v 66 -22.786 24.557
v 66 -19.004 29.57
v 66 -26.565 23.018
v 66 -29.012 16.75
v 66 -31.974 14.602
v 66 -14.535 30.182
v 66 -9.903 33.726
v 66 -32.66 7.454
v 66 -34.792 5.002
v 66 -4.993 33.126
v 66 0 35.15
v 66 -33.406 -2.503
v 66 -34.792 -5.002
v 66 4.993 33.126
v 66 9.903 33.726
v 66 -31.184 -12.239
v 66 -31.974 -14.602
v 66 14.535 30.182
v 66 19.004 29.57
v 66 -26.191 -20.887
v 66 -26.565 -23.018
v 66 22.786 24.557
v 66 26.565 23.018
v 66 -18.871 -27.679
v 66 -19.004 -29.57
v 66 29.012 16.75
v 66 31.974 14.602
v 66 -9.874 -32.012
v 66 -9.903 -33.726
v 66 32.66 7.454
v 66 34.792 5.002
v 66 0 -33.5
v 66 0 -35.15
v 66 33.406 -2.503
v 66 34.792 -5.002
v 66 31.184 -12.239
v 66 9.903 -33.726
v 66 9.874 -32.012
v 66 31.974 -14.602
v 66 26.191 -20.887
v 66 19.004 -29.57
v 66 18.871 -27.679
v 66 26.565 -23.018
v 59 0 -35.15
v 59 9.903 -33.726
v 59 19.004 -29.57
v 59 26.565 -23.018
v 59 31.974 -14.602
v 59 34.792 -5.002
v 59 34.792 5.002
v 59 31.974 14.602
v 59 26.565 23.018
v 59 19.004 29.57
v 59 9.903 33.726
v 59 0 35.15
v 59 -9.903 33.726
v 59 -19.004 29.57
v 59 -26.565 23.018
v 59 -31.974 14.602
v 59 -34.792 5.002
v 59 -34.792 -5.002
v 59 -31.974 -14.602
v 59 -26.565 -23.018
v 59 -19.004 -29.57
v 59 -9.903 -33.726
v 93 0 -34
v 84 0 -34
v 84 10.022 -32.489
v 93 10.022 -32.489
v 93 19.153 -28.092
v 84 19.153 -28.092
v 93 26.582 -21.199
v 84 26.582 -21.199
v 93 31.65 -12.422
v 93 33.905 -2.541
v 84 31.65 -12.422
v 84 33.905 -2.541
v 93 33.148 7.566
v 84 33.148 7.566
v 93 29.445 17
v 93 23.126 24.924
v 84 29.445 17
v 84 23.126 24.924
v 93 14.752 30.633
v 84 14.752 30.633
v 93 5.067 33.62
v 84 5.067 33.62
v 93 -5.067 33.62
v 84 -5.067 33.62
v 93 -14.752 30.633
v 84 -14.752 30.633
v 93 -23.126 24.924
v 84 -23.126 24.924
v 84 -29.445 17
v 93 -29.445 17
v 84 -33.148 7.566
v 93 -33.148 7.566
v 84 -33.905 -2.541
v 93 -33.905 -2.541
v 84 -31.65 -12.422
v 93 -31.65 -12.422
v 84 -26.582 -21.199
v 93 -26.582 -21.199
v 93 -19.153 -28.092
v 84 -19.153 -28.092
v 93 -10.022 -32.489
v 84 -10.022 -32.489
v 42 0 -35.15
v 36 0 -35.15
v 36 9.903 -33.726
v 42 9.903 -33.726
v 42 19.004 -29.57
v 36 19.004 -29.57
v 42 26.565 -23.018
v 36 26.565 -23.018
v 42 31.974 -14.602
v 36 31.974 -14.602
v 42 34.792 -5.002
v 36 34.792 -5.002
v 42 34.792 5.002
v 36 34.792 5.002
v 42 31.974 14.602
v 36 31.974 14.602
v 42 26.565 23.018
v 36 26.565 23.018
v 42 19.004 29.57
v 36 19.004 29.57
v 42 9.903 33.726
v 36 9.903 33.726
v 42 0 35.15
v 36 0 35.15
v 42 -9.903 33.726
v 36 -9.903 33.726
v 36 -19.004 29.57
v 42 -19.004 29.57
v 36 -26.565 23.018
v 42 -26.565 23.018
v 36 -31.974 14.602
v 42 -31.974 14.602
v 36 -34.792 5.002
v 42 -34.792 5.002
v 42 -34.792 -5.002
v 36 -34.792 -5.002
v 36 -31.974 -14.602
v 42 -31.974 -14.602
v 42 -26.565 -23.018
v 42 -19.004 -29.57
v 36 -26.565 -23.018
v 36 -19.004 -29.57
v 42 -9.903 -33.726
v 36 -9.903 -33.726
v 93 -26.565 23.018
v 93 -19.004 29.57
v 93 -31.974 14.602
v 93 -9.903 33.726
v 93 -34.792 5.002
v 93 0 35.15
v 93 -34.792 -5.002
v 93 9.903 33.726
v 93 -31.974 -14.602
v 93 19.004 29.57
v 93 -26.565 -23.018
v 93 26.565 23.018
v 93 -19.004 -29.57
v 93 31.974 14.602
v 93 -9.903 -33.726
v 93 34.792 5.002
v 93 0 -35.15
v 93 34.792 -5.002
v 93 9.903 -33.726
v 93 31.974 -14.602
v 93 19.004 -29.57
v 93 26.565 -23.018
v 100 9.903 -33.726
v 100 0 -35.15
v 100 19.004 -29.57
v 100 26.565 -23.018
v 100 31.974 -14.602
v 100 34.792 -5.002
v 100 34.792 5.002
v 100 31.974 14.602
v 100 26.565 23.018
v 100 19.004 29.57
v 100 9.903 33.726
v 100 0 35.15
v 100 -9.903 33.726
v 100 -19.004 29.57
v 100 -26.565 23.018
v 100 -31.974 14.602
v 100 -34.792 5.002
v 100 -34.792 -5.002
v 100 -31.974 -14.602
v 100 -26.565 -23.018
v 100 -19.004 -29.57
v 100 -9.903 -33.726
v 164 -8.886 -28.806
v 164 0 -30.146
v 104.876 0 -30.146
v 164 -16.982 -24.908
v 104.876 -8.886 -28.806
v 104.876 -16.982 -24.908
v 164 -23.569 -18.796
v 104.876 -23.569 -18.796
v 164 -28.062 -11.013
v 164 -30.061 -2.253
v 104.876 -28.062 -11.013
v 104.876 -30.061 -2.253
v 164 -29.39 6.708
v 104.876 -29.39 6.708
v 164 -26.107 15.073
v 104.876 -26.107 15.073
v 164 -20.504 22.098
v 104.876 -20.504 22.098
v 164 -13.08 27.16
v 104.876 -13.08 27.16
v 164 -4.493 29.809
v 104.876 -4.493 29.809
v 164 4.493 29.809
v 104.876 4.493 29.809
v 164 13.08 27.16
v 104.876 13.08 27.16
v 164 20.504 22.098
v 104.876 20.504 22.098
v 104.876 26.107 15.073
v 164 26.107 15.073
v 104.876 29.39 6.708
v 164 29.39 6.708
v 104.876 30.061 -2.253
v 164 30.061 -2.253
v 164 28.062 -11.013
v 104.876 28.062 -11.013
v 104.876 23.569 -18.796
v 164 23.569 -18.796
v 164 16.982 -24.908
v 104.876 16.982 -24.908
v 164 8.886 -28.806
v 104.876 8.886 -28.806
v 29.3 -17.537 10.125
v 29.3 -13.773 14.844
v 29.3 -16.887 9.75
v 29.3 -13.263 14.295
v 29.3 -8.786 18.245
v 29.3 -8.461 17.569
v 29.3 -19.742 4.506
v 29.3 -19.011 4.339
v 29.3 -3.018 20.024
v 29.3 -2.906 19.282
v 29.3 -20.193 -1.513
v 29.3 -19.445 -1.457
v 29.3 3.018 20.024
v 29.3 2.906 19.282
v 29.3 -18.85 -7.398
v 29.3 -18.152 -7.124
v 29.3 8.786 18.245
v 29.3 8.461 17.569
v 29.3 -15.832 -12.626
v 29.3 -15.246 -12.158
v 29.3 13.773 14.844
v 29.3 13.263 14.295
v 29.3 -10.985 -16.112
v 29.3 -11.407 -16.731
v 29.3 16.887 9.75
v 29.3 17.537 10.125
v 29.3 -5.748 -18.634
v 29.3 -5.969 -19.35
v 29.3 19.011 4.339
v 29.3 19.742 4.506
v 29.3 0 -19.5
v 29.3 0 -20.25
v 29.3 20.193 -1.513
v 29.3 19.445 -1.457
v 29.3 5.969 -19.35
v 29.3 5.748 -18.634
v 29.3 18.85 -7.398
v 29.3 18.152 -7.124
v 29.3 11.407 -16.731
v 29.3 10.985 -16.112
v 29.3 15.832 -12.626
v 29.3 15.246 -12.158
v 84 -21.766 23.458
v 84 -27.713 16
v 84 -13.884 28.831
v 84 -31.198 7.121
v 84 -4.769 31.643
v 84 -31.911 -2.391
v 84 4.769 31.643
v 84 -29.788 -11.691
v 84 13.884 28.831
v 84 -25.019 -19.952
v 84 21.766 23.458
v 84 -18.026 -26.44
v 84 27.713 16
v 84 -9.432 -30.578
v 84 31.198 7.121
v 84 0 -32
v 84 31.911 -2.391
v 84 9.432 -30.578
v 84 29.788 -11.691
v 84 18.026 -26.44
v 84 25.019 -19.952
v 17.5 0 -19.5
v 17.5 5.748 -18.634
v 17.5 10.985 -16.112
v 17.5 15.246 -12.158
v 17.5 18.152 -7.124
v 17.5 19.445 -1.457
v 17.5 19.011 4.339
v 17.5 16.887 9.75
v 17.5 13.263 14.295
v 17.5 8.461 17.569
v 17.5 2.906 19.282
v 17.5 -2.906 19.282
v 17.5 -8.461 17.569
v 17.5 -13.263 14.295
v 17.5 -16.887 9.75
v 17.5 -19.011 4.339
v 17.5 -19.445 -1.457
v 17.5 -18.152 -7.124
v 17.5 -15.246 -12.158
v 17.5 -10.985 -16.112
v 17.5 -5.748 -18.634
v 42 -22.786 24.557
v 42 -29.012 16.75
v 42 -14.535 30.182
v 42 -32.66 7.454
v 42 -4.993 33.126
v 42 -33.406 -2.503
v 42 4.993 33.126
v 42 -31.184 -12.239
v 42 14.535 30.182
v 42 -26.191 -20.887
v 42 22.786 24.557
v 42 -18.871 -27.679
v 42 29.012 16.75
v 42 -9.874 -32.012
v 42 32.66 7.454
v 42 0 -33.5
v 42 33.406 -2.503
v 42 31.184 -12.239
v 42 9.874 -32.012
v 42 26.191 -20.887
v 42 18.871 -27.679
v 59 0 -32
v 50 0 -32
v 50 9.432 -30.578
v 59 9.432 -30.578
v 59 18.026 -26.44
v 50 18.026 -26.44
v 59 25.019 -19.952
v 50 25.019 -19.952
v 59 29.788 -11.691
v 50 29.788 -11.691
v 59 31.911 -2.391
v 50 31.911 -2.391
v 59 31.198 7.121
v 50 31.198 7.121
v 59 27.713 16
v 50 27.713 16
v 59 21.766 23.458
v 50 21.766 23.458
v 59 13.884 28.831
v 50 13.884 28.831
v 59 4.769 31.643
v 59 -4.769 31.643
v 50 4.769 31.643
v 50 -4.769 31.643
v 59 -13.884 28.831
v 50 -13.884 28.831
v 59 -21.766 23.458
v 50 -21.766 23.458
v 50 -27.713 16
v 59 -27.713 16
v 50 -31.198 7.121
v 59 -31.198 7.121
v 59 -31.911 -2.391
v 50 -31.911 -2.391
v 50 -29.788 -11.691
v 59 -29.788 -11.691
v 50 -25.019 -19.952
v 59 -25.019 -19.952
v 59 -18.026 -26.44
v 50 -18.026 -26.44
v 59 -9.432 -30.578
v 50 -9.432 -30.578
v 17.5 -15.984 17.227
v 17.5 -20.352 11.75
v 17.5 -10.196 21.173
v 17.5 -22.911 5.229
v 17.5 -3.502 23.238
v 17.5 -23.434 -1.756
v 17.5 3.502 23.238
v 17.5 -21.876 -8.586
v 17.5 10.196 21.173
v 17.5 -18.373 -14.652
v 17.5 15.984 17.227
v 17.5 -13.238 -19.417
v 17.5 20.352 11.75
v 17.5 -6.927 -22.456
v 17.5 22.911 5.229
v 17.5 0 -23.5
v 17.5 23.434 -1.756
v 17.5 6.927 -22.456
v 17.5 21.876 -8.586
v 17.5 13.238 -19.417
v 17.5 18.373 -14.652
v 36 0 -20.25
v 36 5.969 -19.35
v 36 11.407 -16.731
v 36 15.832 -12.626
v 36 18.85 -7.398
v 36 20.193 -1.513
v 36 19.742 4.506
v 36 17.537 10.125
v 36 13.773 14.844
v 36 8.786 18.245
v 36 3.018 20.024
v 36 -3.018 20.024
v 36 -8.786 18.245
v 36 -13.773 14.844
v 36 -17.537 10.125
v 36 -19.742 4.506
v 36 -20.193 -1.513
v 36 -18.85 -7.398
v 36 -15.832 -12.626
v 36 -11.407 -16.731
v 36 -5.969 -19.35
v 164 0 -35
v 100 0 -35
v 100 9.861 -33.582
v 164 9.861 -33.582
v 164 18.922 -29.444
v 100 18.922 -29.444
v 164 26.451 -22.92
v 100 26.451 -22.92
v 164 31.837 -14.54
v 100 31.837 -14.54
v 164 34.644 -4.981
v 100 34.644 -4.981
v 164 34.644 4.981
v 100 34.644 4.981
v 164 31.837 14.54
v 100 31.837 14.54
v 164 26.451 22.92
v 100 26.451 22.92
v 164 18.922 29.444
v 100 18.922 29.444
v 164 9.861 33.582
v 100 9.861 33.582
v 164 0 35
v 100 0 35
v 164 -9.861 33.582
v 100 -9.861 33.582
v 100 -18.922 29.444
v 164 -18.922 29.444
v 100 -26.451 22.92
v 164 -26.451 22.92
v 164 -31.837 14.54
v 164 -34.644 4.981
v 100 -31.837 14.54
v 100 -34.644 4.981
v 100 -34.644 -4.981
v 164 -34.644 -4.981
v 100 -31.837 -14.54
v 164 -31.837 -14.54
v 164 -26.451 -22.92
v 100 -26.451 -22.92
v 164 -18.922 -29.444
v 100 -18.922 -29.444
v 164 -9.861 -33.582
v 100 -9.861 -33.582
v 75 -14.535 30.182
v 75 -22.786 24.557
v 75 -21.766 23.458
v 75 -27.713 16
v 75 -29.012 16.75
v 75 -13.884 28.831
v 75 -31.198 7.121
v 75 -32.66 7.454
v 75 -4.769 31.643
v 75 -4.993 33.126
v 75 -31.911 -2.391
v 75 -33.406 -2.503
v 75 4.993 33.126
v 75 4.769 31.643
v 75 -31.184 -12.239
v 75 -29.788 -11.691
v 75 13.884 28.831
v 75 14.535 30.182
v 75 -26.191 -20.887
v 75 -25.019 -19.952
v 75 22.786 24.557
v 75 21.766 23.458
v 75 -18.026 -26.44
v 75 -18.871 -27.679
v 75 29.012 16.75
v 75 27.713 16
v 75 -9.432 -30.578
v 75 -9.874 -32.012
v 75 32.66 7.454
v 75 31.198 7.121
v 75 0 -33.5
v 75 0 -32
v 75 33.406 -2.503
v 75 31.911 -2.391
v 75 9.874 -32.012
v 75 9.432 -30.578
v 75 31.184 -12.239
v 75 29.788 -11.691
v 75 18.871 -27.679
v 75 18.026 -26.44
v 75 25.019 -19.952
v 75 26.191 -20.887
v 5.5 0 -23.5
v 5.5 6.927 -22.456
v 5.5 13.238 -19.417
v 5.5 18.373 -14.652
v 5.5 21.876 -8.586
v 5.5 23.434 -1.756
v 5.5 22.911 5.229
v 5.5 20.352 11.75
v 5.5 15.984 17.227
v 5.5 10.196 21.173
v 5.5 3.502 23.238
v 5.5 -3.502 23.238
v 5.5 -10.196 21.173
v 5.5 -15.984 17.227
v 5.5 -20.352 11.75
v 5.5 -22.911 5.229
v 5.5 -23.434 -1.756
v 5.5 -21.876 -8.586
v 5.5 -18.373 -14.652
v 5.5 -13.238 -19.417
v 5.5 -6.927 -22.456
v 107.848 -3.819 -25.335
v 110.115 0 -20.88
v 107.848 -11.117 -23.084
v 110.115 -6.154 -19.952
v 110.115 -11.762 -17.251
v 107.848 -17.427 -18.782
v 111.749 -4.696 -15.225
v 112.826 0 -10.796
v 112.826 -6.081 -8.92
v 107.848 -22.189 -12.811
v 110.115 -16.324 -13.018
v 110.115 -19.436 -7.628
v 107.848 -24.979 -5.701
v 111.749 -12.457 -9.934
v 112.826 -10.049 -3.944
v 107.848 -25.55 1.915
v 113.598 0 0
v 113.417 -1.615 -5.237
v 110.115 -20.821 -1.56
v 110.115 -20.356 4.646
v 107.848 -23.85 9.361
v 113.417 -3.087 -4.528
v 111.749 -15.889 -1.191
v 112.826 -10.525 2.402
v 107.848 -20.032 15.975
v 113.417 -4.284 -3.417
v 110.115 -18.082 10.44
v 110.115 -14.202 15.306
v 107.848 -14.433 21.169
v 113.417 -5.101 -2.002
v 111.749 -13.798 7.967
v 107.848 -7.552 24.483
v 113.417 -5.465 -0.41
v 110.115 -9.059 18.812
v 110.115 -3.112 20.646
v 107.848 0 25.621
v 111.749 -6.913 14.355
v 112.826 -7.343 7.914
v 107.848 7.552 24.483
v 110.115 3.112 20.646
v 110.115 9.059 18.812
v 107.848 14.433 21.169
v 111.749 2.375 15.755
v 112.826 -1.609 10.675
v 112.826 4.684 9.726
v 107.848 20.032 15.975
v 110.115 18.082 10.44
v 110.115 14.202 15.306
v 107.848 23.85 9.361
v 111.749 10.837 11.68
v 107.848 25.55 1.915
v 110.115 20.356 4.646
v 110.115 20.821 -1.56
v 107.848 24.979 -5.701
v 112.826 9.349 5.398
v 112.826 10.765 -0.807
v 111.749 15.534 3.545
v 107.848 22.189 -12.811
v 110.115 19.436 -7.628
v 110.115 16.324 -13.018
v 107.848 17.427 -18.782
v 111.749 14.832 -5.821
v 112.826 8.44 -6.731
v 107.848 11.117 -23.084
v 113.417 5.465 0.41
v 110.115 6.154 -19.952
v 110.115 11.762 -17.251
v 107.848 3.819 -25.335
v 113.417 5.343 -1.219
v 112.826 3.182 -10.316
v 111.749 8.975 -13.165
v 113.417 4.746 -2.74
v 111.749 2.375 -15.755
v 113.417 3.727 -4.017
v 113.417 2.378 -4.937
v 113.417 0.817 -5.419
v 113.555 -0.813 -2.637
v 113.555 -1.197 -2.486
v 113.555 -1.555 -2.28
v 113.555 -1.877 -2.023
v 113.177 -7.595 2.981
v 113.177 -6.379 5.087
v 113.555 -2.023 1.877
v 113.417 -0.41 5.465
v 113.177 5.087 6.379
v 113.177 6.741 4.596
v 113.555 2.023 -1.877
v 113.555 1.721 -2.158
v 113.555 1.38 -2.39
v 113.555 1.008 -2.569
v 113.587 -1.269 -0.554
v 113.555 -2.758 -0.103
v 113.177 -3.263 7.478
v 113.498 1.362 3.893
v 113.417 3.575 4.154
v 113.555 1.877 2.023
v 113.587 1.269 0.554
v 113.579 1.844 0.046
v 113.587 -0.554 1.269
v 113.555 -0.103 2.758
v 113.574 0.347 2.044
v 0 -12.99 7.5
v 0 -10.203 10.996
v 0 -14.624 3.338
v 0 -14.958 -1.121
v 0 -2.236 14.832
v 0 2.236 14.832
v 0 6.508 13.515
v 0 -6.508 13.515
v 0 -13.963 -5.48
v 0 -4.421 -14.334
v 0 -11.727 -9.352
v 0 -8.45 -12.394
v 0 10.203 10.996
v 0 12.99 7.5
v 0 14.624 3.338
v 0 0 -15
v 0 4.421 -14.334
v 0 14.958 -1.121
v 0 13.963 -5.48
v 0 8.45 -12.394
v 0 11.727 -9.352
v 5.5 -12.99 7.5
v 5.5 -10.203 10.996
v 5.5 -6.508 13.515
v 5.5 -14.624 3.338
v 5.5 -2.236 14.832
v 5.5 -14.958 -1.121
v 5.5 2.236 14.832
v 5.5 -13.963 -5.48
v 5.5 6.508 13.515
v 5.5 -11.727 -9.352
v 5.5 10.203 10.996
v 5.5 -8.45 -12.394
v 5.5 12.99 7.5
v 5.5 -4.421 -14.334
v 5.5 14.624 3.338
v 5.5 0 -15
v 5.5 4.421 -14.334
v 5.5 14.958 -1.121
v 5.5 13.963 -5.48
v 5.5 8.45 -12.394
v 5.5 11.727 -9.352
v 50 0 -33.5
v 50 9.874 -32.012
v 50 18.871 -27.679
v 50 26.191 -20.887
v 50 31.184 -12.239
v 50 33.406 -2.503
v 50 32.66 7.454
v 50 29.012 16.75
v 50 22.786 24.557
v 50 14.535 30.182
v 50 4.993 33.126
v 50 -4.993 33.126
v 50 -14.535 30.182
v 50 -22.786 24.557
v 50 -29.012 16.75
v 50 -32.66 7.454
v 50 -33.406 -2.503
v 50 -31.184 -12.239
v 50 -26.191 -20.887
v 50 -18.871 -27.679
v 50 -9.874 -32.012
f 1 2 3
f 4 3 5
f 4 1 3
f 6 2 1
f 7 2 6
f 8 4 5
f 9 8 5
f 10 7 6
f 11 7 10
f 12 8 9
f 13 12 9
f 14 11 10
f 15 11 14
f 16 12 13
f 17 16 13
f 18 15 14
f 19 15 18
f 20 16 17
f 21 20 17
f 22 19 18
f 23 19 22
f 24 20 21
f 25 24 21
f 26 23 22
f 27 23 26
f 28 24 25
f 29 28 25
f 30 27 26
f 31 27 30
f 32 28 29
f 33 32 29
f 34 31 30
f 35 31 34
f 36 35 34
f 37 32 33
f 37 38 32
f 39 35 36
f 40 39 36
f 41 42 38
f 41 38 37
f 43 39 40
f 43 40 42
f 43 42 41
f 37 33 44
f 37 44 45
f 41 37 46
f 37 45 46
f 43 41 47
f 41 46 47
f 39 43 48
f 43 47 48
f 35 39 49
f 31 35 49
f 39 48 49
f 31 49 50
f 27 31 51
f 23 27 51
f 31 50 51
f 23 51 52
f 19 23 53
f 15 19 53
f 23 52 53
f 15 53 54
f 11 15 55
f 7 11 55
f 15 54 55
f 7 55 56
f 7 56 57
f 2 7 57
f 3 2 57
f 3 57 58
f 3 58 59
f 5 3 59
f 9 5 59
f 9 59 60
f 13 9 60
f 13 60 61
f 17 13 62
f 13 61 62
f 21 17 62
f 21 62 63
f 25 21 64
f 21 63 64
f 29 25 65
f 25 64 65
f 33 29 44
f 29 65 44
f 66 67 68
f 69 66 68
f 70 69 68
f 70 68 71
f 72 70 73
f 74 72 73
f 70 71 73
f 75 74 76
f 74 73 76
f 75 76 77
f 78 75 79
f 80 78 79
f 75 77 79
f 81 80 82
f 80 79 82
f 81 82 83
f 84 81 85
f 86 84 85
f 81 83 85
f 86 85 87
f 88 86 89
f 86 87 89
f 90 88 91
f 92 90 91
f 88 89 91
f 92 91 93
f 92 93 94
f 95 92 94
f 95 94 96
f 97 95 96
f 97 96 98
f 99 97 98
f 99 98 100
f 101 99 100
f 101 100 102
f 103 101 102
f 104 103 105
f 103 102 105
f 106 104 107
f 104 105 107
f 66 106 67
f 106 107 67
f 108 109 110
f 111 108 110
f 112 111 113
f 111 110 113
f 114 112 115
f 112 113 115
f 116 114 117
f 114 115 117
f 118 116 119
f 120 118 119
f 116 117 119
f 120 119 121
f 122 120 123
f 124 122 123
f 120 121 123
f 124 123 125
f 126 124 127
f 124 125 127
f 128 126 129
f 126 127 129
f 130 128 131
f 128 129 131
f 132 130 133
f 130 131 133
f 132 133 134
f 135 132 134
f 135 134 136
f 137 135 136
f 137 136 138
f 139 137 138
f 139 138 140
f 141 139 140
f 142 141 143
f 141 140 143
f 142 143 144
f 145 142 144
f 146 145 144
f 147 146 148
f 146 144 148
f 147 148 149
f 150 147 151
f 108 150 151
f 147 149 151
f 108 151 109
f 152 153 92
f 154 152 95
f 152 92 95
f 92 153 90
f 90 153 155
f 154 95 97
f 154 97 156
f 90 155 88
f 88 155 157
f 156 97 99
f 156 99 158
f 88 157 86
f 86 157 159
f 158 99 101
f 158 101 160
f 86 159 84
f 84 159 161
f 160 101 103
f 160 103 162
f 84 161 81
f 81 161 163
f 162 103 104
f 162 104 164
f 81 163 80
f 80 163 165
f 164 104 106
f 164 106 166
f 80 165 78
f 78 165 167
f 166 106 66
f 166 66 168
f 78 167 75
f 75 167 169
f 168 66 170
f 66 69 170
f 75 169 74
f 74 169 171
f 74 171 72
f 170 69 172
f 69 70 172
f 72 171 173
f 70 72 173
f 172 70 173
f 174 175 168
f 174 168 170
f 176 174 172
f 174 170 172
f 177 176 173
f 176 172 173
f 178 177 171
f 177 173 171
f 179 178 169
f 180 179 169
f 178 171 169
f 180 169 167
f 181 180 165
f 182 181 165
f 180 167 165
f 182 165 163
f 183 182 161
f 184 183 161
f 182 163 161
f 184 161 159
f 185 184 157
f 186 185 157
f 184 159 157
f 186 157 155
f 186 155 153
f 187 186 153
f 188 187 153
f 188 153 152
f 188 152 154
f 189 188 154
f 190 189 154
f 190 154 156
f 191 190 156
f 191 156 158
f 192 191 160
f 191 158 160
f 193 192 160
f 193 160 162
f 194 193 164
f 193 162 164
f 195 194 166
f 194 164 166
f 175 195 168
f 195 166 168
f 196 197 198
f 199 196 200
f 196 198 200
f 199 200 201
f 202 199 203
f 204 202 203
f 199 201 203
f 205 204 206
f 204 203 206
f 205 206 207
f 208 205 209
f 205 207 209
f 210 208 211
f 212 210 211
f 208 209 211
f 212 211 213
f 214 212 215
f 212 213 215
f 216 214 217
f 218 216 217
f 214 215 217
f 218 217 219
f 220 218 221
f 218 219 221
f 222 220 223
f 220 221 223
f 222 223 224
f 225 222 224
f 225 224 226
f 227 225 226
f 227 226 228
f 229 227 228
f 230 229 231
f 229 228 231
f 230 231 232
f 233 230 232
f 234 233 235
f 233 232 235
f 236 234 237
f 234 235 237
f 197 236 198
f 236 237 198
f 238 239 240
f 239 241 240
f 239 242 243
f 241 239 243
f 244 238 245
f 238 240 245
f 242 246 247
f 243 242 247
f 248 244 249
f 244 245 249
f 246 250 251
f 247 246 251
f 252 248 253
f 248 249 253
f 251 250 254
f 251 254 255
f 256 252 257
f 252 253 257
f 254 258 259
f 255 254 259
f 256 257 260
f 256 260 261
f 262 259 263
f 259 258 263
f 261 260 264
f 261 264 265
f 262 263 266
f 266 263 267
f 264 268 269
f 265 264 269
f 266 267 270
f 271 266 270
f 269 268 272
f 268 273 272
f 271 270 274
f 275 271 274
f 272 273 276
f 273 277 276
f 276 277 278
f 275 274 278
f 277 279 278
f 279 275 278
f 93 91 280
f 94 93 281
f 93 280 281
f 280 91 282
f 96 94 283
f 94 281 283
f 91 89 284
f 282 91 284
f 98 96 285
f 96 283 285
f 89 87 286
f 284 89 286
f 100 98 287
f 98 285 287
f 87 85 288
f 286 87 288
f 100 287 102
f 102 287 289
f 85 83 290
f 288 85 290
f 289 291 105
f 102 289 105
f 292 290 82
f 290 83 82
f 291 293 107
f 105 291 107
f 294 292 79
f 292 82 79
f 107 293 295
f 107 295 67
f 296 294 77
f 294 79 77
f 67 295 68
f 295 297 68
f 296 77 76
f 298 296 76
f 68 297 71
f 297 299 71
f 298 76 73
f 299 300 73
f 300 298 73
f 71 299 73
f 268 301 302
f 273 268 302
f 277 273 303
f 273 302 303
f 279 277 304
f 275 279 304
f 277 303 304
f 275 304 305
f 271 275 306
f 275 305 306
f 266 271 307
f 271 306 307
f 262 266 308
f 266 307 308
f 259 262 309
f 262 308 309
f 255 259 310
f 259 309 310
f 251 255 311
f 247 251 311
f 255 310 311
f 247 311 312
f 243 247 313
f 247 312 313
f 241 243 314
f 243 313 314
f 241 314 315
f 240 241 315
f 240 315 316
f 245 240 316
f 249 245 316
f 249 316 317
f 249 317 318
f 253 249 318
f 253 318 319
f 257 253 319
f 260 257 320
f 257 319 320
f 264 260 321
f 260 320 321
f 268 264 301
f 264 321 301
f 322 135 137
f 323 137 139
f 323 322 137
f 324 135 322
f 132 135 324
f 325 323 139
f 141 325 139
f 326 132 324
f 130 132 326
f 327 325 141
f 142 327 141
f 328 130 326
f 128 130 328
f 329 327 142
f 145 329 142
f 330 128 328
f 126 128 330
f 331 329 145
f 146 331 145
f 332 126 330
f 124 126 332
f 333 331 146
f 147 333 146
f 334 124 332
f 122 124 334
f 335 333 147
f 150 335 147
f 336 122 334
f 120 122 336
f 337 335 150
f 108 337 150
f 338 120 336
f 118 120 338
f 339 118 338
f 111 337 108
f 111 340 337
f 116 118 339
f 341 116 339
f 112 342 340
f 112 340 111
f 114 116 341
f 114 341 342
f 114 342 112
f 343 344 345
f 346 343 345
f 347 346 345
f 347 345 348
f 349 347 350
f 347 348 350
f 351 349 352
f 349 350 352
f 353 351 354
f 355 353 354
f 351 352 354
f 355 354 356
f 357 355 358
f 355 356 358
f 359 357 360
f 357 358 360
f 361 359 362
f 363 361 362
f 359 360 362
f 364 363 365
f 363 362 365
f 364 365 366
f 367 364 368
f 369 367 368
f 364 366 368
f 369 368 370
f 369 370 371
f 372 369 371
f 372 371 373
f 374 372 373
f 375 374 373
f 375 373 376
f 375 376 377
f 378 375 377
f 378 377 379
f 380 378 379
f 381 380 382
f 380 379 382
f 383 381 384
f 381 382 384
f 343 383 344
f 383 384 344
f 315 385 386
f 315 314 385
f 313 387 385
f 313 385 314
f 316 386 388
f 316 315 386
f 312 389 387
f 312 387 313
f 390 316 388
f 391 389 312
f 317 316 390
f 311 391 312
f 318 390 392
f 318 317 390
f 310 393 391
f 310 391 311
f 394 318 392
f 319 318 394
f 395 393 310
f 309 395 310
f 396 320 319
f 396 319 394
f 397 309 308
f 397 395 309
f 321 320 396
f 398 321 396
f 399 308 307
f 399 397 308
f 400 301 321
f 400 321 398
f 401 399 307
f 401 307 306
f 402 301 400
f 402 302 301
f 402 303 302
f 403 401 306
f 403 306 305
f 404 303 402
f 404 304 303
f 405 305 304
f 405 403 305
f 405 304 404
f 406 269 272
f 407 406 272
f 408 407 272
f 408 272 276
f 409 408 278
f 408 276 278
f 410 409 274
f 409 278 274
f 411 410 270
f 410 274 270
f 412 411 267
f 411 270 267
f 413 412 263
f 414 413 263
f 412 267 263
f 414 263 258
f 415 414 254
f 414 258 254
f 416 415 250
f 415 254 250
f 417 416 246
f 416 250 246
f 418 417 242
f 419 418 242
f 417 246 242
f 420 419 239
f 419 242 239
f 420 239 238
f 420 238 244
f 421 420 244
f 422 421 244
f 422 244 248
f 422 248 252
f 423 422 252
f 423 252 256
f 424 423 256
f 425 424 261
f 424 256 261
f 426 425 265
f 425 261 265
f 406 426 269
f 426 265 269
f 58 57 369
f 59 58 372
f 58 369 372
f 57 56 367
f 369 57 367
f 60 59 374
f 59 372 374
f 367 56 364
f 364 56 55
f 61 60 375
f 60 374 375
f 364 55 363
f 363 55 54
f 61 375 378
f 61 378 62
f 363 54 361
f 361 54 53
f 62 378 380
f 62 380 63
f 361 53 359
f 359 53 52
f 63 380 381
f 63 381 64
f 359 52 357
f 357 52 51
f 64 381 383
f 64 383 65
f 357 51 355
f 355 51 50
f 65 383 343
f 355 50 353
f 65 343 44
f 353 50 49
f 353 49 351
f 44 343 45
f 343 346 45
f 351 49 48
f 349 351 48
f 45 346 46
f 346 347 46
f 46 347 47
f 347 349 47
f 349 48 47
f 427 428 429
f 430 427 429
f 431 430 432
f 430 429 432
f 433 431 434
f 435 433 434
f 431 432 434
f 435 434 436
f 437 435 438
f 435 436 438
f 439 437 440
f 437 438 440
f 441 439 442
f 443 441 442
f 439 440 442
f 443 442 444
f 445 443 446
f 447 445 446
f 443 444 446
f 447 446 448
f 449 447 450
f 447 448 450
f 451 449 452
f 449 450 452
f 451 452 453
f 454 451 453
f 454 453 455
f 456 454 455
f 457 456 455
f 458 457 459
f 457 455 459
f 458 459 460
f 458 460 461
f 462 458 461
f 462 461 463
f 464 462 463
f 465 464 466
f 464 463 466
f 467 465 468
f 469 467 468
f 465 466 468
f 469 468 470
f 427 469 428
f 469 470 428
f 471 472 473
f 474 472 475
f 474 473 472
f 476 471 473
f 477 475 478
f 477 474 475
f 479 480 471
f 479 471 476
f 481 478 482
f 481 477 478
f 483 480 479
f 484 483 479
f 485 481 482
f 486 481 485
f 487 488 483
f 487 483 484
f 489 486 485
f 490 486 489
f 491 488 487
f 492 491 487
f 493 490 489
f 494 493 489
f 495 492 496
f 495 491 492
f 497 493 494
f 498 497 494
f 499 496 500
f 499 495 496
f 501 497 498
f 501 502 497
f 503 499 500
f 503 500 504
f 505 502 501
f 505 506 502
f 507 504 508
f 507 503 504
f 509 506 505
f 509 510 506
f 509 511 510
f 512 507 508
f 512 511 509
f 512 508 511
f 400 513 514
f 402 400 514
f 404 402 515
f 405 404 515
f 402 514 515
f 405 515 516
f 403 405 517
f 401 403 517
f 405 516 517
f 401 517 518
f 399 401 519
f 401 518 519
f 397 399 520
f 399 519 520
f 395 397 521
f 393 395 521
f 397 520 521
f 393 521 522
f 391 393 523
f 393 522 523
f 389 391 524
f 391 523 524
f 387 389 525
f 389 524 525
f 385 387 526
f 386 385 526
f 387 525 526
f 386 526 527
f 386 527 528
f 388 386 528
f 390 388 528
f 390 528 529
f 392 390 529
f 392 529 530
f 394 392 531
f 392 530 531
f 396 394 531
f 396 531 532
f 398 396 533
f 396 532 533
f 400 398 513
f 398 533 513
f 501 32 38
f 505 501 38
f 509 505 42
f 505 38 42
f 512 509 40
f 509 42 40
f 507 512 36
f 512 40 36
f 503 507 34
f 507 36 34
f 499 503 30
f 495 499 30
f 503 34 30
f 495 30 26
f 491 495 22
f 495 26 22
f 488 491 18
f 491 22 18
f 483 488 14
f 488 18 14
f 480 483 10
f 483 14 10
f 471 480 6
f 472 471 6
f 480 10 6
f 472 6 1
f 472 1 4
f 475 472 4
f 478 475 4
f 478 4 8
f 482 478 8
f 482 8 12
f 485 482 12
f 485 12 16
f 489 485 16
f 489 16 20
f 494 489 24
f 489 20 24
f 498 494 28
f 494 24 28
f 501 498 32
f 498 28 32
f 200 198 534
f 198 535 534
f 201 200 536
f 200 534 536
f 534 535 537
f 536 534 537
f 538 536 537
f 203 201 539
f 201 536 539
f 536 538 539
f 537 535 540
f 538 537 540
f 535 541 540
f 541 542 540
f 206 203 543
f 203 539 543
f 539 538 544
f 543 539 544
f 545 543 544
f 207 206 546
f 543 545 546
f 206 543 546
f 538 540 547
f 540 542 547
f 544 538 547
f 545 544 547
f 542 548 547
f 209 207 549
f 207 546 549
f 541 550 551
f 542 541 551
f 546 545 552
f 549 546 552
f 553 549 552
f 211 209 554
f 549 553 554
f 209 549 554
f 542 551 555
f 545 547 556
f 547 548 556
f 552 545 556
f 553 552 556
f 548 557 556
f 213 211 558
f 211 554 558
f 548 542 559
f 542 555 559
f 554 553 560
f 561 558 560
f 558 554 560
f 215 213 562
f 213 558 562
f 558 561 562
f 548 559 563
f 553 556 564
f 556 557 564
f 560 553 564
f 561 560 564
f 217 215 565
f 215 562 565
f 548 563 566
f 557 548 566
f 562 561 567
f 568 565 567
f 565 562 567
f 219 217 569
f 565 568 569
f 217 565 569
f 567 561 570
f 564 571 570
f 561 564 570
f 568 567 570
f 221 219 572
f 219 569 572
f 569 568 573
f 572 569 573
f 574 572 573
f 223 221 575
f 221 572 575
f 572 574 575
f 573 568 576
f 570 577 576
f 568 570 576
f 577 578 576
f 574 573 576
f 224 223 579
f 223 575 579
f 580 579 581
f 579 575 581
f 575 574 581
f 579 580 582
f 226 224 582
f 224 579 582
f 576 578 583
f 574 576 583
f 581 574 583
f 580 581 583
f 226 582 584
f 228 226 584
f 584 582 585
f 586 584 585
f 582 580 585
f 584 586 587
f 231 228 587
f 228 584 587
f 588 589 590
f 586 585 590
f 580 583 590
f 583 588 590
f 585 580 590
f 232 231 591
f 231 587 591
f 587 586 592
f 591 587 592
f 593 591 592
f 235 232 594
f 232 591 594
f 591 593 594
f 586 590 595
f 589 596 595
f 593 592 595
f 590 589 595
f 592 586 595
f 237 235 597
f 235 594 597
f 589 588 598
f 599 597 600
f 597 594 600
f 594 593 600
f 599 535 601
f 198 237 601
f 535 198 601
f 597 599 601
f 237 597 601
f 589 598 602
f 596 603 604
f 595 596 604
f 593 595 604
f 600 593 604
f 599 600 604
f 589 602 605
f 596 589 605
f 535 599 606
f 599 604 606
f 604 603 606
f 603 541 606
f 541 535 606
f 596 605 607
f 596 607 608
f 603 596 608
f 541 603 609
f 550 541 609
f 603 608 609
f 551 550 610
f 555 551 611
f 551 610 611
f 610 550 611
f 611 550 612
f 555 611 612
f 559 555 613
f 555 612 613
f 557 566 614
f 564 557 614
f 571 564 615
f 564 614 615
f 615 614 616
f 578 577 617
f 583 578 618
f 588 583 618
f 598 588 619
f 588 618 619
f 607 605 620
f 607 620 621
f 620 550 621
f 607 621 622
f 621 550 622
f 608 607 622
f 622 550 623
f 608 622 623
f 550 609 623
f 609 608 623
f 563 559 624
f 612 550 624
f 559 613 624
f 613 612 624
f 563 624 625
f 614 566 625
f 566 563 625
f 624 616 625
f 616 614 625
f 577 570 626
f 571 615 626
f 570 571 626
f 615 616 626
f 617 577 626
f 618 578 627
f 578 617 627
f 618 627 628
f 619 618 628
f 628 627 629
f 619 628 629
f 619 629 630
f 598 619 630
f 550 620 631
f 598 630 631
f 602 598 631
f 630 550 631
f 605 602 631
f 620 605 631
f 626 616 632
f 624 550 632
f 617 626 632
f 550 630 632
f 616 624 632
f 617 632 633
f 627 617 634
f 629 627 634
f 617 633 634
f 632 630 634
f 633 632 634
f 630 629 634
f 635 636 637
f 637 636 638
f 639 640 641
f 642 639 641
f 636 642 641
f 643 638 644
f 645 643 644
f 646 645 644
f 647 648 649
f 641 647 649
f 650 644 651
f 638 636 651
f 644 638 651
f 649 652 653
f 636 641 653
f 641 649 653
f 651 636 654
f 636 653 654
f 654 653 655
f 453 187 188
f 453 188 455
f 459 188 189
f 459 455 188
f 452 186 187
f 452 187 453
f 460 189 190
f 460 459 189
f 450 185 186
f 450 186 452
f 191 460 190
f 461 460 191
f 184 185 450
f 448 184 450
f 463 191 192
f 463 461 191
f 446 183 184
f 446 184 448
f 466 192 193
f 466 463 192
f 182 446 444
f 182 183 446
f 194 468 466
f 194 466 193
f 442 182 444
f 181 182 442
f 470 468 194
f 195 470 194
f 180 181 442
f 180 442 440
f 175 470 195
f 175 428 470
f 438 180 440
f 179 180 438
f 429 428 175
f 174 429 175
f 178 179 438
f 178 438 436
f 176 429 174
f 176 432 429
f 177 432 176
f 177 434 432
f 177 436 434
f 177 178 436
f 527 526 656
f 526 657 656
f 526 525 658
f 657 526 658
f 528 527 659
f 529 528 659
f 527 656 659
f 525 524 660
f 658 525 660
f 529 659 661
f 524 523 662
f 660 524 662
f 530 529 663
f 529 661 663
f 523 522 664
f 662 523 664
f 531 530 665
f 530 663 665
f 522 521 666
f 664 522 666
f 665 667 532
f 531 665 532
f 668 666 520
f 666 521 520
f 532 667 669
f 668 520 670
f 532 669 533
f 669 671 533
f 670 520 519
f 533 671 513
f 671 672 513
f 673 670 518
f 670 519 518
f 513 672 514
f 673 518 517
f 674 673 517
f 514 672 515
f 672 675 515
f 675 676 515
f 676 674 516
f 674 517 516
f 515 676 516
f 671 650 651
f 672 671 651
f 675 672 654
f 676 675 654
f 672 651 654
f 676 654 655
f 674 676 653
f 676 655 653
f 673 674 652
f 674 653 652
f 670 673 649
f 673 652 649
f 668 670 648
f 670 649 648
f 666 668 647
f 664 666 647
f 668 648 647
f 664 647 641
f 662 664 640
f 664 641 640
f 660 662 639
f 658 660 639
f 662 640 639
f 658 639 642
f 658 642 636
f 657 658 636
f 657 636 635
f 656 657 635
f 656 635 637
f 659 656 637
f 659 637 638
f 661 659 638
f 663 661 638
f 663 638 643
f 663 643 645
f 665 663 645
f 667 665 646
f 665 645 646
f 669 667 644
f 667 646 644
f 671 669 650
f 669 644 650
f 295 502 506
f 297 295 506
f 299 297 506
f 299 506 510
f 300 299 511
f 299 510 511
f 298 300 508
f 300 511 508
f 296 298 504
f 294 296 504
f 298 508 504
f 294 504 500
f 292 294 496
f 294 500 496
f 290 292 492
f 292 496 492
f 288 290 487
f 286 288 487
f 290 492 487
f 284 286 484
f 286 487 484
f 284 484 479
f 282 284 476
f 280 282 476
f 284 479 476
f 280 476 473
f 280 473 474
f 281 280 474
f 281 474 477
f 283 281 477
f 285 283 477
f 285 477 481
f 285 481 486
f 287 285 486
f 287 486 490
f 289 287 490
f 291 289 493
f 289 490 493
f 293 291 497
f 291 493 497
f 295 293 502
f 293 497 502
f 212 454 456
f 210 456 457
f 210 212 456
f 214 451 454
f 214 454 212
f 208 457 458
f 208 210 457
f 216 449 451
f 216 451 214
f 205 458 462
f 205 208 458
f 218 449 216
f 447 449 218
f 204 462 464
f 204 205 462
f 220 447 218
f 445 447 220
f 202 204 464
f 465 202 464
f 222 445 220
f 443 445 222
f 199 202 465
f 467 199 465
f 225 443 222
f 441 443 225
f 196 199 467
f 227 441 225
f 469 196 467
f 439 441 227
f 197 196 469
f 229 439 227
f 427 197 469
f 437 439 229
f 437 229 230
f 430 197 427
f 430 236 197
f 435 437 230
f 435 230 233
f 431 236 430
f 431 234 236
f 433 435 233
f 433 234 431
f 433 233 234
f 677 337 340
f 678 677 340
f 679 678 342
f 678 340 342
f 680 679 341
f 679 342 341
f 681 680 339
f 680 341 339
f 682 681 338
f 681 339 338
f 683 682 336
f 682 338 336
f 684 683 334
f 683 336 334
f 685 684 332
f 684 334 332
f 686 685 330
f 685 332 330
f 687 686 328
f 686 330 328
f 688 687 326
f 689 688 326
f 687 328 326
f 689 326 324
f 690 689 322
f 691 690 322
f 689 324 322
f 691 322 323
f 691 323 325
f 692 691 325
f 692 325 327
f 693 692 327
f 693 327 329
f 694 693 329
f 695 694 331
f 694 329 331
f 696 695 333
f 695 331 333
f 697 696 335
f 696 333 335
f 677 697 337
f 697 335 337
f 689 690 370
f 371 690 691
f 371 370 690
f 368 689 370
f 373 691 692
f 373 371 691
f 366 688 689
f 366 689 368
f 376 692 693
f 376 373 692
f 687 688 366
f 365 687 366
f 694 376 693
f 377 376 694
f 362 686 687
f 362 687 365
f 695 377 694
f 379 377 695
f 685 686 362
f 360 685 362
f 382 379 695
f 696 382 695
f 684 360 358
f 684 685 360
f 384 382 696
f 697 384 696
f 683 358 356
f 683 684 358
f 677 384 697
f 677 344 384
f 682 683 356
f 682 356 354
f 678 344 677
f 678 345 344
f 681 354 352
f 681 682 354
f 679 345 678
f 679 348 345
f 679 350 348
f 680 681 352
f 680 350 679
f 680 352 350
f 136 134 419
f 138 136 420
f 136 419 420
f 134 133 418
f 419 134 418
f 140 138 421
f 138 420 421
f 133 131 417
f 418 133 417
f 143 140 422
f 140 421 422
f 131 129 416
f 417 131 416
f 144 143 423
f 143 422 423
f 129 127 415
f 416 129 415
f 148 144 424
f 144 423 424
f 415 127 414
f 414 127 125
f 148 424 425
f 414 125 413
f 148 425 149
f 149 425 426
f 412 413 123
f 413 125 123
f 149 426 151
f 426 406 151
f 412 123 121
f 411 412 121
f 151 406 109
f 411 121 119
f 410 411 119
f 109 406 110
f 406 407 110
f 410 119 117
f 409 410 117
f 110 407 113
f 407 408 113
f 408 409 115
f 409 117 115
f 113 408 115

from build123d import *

# Parameters (mm, degrees)
SKETCH1_R            = 15
BOSS_EXTRUDE1_DEPTH  = 5.5
SKETCH2_R            = 23.5
BOSS_EXTRUDE2_DEPTH  = 12
SKETCH4_R            = 19.5
BOSS_EXTRUDE3_DEPTH  = 11.8
SKETCH6_R            = 20.25
BOSS_EXTRUDE4_DEPTH  = 6.7
SKETCH7_R            = 35.15
BOSS_EXTRUDE5_DEPTH  = 6
SKETCH8_R            = 33.5
BOSS_EXTRUDE6_DEPTH  = 8
SKETCH9_R            = 32
BOSS_EXTRUDE7_DEPTH  = 9
SKETCH10_R           = 35.15
BOSS_EXTRUDE8_DEPTH  = 7
SKETCH11_R           = 33.5
BOSS_EXTRUDE9_DEPTH  = 9
SKETCH12_R           = 32
BOSS_EXTRUDE10_DEPTH = 9
SKETCH13_R           = 34
BOSS_EXTRUDE11_DEPTH = 9
SKETCH14_R           = 35.15
BOSS_EXTRUDE12_DEPTH = 7
SKETCH15_R           = 35
BOSS_EXTRUDE13_DEPTH = 64


with BuildPart() as part:
    # Sketch1 → Boss-Extrude1 (new body)
    with BuildSketch(Plane(origin=(0, 0, 0), x_dir=(0, 0, -1), z_dir=(1, 0, 0))):
        Circle(SKETCH1_R)
    extrude(amount=BOSS_EXTRUDE1_DEPTH)

    # Sketch2 → Boss-Extrude2 (add)
    with BuildSketch(Plane(origin=(5.5, 0, 0), x_dir=(0, 0, -1), z_dir=(1, 0, 0))):
        Circle(SKETCH2_R)
    extrude(amount=BOSS_EXTRUDE2_DEPTH)

    # Sketch4 → Boss-Extrude3 (add)
    with BuildSketch(Plane(origin=(17.5, 0, 0), x_dir=(0, 0, -1), z_dir=(1, 0, 0))):
        Circle(SKETCH4_R)
    extrude(amount=BOSS_EXTRUDE3_DEPTH)

    # Sketch6 → Boss-Extrude4 (add)
    with BuildSketch(Plane(origin=(29.3, 0, 0), x_dir=(0, 0, -1), z_dir=(1, 0, 0))):
        Circle(SKETCH6_R)
    extrude(amount=BOSS_EXTRUDE4_DEPTH)

    # Sketch7 → Boss-Extrude5 (add)
    with BuildSketch(Plane(origin=(36, 0, 0), x_dir=(0, 0, -1), z_dir=(1, 0, 0))):
        Circle(SKETCH7_R)
    extrude(amount=BOSS_EXTRUDE5_DEPTH)

    # Sketch8 → Boss-Extrude6 (add)
    with BuildSketch(Plane(origin=(42, 0, 0), x_dir=(0, 0, -1), z_dir=(1, 0, 0))):
        Circle(SKETCH8_R)
    extrude(amount=BOSS_EXTRUDE6_DEPTH)

    # Sketch9 → Boss-Extrude7 (add)
    with BuildSketch(Plane(origin=(50, 0, 0), x_dir=(0, 0, -1), z_dir=(1, 0, 0))):
        Circle(SKETCH9_R)
    extrude(amount=BOSS_EXTRUDE7_DEPTH)

    # Sketch10 → Boss-Extrude8 (add)
    with BuildSketch(Plane(origin=(59, 0, 0), x_dir=(0, 0, -1), z_dir=(1, 0, 0))):
        Circle(SKETCH10_R)
    extrude(amount=BOSS_EXTRUDE8_DEPTH)

    # Sketch11 → Boss-Extrude9 (add)
    with BuildSketch(Plane(origin=(66, 0, 0), x_dir=(0, 0, -1), z_dir=(1, 0, 0))):
        Circle(SKETCH11_R)
    extrude(amount=BOSS_EXTRUDE9_DEPTH)

    # Sketch12 → Boss-Extrude10 (add)
    with BuildSketch(Plane(origin=(75, 0, 0), x_dir=(0, 0, -1), z_dir=(1, 0, 0))):
        Circle(SKETCH12_R)
    extrude(amount=BOSS_EXTRUDE10_DEPTH)

    # Sketch13 → Boss-Extrude11 (add)
    with BuildSketch(Plane(origin=(84, 0, 0), x_dir=(0, 0, -1), z_dir=(1, 0, 0))):
        Circle(SKETCH13_R)
    extrude(amount=BOSS_EXTRUDE11_DEPTH)

    # Sketch14 → Boss-Extrude12 (add)
    with BuildSketch(Plane(origin=(93, 0, 0), x_dir=(0, 0, -1), z_dir=(1, 0, 0))):
        Circle(SKETCH14_R)
    extrude(amount=BOSS_EXTRUDE12_DEPTH)

    # Sketch15 → Boss-Extrude13 (add)
    with BuildSketch(Plane(origin=(100, 0, 0), x_dir=(0, 0, -1), z_dir=(1, 0, 0))):
        Circle(SKETCH15_R)
    extrude(amount=BOSS_EXTRUDE13_DEPTH)

    # Sketch16 → Cut-Revolve1 (revolve, cut)
    with BuildSketch(Plane(origin=(0, 0, 0), x_dir=(1, 0, 0), z_dir=(0, 1, 0))):
        with BuildLine():
            Line((164, 30.145778452), (104.875699315, 30.145778452))
            add(Edge.make_bspline(
                [(104.875699315, 30.145778452), (111.575177395, 21.323772465), (113.598201805, 11.115911288), (113.598201805, 0)],
                knots=[0, 0, 0, 0, 1, 1, 1, 1], degree=3))
            Line((113.598201805, 0), (164, 0))
            Line((164, 0), (164, 30.145778452))
        make_face()
    revolve(axis=Axis((164, 0, 0), (-1, 0, 0)), mode=Mode.SUBTRACT)


solid = part.part
